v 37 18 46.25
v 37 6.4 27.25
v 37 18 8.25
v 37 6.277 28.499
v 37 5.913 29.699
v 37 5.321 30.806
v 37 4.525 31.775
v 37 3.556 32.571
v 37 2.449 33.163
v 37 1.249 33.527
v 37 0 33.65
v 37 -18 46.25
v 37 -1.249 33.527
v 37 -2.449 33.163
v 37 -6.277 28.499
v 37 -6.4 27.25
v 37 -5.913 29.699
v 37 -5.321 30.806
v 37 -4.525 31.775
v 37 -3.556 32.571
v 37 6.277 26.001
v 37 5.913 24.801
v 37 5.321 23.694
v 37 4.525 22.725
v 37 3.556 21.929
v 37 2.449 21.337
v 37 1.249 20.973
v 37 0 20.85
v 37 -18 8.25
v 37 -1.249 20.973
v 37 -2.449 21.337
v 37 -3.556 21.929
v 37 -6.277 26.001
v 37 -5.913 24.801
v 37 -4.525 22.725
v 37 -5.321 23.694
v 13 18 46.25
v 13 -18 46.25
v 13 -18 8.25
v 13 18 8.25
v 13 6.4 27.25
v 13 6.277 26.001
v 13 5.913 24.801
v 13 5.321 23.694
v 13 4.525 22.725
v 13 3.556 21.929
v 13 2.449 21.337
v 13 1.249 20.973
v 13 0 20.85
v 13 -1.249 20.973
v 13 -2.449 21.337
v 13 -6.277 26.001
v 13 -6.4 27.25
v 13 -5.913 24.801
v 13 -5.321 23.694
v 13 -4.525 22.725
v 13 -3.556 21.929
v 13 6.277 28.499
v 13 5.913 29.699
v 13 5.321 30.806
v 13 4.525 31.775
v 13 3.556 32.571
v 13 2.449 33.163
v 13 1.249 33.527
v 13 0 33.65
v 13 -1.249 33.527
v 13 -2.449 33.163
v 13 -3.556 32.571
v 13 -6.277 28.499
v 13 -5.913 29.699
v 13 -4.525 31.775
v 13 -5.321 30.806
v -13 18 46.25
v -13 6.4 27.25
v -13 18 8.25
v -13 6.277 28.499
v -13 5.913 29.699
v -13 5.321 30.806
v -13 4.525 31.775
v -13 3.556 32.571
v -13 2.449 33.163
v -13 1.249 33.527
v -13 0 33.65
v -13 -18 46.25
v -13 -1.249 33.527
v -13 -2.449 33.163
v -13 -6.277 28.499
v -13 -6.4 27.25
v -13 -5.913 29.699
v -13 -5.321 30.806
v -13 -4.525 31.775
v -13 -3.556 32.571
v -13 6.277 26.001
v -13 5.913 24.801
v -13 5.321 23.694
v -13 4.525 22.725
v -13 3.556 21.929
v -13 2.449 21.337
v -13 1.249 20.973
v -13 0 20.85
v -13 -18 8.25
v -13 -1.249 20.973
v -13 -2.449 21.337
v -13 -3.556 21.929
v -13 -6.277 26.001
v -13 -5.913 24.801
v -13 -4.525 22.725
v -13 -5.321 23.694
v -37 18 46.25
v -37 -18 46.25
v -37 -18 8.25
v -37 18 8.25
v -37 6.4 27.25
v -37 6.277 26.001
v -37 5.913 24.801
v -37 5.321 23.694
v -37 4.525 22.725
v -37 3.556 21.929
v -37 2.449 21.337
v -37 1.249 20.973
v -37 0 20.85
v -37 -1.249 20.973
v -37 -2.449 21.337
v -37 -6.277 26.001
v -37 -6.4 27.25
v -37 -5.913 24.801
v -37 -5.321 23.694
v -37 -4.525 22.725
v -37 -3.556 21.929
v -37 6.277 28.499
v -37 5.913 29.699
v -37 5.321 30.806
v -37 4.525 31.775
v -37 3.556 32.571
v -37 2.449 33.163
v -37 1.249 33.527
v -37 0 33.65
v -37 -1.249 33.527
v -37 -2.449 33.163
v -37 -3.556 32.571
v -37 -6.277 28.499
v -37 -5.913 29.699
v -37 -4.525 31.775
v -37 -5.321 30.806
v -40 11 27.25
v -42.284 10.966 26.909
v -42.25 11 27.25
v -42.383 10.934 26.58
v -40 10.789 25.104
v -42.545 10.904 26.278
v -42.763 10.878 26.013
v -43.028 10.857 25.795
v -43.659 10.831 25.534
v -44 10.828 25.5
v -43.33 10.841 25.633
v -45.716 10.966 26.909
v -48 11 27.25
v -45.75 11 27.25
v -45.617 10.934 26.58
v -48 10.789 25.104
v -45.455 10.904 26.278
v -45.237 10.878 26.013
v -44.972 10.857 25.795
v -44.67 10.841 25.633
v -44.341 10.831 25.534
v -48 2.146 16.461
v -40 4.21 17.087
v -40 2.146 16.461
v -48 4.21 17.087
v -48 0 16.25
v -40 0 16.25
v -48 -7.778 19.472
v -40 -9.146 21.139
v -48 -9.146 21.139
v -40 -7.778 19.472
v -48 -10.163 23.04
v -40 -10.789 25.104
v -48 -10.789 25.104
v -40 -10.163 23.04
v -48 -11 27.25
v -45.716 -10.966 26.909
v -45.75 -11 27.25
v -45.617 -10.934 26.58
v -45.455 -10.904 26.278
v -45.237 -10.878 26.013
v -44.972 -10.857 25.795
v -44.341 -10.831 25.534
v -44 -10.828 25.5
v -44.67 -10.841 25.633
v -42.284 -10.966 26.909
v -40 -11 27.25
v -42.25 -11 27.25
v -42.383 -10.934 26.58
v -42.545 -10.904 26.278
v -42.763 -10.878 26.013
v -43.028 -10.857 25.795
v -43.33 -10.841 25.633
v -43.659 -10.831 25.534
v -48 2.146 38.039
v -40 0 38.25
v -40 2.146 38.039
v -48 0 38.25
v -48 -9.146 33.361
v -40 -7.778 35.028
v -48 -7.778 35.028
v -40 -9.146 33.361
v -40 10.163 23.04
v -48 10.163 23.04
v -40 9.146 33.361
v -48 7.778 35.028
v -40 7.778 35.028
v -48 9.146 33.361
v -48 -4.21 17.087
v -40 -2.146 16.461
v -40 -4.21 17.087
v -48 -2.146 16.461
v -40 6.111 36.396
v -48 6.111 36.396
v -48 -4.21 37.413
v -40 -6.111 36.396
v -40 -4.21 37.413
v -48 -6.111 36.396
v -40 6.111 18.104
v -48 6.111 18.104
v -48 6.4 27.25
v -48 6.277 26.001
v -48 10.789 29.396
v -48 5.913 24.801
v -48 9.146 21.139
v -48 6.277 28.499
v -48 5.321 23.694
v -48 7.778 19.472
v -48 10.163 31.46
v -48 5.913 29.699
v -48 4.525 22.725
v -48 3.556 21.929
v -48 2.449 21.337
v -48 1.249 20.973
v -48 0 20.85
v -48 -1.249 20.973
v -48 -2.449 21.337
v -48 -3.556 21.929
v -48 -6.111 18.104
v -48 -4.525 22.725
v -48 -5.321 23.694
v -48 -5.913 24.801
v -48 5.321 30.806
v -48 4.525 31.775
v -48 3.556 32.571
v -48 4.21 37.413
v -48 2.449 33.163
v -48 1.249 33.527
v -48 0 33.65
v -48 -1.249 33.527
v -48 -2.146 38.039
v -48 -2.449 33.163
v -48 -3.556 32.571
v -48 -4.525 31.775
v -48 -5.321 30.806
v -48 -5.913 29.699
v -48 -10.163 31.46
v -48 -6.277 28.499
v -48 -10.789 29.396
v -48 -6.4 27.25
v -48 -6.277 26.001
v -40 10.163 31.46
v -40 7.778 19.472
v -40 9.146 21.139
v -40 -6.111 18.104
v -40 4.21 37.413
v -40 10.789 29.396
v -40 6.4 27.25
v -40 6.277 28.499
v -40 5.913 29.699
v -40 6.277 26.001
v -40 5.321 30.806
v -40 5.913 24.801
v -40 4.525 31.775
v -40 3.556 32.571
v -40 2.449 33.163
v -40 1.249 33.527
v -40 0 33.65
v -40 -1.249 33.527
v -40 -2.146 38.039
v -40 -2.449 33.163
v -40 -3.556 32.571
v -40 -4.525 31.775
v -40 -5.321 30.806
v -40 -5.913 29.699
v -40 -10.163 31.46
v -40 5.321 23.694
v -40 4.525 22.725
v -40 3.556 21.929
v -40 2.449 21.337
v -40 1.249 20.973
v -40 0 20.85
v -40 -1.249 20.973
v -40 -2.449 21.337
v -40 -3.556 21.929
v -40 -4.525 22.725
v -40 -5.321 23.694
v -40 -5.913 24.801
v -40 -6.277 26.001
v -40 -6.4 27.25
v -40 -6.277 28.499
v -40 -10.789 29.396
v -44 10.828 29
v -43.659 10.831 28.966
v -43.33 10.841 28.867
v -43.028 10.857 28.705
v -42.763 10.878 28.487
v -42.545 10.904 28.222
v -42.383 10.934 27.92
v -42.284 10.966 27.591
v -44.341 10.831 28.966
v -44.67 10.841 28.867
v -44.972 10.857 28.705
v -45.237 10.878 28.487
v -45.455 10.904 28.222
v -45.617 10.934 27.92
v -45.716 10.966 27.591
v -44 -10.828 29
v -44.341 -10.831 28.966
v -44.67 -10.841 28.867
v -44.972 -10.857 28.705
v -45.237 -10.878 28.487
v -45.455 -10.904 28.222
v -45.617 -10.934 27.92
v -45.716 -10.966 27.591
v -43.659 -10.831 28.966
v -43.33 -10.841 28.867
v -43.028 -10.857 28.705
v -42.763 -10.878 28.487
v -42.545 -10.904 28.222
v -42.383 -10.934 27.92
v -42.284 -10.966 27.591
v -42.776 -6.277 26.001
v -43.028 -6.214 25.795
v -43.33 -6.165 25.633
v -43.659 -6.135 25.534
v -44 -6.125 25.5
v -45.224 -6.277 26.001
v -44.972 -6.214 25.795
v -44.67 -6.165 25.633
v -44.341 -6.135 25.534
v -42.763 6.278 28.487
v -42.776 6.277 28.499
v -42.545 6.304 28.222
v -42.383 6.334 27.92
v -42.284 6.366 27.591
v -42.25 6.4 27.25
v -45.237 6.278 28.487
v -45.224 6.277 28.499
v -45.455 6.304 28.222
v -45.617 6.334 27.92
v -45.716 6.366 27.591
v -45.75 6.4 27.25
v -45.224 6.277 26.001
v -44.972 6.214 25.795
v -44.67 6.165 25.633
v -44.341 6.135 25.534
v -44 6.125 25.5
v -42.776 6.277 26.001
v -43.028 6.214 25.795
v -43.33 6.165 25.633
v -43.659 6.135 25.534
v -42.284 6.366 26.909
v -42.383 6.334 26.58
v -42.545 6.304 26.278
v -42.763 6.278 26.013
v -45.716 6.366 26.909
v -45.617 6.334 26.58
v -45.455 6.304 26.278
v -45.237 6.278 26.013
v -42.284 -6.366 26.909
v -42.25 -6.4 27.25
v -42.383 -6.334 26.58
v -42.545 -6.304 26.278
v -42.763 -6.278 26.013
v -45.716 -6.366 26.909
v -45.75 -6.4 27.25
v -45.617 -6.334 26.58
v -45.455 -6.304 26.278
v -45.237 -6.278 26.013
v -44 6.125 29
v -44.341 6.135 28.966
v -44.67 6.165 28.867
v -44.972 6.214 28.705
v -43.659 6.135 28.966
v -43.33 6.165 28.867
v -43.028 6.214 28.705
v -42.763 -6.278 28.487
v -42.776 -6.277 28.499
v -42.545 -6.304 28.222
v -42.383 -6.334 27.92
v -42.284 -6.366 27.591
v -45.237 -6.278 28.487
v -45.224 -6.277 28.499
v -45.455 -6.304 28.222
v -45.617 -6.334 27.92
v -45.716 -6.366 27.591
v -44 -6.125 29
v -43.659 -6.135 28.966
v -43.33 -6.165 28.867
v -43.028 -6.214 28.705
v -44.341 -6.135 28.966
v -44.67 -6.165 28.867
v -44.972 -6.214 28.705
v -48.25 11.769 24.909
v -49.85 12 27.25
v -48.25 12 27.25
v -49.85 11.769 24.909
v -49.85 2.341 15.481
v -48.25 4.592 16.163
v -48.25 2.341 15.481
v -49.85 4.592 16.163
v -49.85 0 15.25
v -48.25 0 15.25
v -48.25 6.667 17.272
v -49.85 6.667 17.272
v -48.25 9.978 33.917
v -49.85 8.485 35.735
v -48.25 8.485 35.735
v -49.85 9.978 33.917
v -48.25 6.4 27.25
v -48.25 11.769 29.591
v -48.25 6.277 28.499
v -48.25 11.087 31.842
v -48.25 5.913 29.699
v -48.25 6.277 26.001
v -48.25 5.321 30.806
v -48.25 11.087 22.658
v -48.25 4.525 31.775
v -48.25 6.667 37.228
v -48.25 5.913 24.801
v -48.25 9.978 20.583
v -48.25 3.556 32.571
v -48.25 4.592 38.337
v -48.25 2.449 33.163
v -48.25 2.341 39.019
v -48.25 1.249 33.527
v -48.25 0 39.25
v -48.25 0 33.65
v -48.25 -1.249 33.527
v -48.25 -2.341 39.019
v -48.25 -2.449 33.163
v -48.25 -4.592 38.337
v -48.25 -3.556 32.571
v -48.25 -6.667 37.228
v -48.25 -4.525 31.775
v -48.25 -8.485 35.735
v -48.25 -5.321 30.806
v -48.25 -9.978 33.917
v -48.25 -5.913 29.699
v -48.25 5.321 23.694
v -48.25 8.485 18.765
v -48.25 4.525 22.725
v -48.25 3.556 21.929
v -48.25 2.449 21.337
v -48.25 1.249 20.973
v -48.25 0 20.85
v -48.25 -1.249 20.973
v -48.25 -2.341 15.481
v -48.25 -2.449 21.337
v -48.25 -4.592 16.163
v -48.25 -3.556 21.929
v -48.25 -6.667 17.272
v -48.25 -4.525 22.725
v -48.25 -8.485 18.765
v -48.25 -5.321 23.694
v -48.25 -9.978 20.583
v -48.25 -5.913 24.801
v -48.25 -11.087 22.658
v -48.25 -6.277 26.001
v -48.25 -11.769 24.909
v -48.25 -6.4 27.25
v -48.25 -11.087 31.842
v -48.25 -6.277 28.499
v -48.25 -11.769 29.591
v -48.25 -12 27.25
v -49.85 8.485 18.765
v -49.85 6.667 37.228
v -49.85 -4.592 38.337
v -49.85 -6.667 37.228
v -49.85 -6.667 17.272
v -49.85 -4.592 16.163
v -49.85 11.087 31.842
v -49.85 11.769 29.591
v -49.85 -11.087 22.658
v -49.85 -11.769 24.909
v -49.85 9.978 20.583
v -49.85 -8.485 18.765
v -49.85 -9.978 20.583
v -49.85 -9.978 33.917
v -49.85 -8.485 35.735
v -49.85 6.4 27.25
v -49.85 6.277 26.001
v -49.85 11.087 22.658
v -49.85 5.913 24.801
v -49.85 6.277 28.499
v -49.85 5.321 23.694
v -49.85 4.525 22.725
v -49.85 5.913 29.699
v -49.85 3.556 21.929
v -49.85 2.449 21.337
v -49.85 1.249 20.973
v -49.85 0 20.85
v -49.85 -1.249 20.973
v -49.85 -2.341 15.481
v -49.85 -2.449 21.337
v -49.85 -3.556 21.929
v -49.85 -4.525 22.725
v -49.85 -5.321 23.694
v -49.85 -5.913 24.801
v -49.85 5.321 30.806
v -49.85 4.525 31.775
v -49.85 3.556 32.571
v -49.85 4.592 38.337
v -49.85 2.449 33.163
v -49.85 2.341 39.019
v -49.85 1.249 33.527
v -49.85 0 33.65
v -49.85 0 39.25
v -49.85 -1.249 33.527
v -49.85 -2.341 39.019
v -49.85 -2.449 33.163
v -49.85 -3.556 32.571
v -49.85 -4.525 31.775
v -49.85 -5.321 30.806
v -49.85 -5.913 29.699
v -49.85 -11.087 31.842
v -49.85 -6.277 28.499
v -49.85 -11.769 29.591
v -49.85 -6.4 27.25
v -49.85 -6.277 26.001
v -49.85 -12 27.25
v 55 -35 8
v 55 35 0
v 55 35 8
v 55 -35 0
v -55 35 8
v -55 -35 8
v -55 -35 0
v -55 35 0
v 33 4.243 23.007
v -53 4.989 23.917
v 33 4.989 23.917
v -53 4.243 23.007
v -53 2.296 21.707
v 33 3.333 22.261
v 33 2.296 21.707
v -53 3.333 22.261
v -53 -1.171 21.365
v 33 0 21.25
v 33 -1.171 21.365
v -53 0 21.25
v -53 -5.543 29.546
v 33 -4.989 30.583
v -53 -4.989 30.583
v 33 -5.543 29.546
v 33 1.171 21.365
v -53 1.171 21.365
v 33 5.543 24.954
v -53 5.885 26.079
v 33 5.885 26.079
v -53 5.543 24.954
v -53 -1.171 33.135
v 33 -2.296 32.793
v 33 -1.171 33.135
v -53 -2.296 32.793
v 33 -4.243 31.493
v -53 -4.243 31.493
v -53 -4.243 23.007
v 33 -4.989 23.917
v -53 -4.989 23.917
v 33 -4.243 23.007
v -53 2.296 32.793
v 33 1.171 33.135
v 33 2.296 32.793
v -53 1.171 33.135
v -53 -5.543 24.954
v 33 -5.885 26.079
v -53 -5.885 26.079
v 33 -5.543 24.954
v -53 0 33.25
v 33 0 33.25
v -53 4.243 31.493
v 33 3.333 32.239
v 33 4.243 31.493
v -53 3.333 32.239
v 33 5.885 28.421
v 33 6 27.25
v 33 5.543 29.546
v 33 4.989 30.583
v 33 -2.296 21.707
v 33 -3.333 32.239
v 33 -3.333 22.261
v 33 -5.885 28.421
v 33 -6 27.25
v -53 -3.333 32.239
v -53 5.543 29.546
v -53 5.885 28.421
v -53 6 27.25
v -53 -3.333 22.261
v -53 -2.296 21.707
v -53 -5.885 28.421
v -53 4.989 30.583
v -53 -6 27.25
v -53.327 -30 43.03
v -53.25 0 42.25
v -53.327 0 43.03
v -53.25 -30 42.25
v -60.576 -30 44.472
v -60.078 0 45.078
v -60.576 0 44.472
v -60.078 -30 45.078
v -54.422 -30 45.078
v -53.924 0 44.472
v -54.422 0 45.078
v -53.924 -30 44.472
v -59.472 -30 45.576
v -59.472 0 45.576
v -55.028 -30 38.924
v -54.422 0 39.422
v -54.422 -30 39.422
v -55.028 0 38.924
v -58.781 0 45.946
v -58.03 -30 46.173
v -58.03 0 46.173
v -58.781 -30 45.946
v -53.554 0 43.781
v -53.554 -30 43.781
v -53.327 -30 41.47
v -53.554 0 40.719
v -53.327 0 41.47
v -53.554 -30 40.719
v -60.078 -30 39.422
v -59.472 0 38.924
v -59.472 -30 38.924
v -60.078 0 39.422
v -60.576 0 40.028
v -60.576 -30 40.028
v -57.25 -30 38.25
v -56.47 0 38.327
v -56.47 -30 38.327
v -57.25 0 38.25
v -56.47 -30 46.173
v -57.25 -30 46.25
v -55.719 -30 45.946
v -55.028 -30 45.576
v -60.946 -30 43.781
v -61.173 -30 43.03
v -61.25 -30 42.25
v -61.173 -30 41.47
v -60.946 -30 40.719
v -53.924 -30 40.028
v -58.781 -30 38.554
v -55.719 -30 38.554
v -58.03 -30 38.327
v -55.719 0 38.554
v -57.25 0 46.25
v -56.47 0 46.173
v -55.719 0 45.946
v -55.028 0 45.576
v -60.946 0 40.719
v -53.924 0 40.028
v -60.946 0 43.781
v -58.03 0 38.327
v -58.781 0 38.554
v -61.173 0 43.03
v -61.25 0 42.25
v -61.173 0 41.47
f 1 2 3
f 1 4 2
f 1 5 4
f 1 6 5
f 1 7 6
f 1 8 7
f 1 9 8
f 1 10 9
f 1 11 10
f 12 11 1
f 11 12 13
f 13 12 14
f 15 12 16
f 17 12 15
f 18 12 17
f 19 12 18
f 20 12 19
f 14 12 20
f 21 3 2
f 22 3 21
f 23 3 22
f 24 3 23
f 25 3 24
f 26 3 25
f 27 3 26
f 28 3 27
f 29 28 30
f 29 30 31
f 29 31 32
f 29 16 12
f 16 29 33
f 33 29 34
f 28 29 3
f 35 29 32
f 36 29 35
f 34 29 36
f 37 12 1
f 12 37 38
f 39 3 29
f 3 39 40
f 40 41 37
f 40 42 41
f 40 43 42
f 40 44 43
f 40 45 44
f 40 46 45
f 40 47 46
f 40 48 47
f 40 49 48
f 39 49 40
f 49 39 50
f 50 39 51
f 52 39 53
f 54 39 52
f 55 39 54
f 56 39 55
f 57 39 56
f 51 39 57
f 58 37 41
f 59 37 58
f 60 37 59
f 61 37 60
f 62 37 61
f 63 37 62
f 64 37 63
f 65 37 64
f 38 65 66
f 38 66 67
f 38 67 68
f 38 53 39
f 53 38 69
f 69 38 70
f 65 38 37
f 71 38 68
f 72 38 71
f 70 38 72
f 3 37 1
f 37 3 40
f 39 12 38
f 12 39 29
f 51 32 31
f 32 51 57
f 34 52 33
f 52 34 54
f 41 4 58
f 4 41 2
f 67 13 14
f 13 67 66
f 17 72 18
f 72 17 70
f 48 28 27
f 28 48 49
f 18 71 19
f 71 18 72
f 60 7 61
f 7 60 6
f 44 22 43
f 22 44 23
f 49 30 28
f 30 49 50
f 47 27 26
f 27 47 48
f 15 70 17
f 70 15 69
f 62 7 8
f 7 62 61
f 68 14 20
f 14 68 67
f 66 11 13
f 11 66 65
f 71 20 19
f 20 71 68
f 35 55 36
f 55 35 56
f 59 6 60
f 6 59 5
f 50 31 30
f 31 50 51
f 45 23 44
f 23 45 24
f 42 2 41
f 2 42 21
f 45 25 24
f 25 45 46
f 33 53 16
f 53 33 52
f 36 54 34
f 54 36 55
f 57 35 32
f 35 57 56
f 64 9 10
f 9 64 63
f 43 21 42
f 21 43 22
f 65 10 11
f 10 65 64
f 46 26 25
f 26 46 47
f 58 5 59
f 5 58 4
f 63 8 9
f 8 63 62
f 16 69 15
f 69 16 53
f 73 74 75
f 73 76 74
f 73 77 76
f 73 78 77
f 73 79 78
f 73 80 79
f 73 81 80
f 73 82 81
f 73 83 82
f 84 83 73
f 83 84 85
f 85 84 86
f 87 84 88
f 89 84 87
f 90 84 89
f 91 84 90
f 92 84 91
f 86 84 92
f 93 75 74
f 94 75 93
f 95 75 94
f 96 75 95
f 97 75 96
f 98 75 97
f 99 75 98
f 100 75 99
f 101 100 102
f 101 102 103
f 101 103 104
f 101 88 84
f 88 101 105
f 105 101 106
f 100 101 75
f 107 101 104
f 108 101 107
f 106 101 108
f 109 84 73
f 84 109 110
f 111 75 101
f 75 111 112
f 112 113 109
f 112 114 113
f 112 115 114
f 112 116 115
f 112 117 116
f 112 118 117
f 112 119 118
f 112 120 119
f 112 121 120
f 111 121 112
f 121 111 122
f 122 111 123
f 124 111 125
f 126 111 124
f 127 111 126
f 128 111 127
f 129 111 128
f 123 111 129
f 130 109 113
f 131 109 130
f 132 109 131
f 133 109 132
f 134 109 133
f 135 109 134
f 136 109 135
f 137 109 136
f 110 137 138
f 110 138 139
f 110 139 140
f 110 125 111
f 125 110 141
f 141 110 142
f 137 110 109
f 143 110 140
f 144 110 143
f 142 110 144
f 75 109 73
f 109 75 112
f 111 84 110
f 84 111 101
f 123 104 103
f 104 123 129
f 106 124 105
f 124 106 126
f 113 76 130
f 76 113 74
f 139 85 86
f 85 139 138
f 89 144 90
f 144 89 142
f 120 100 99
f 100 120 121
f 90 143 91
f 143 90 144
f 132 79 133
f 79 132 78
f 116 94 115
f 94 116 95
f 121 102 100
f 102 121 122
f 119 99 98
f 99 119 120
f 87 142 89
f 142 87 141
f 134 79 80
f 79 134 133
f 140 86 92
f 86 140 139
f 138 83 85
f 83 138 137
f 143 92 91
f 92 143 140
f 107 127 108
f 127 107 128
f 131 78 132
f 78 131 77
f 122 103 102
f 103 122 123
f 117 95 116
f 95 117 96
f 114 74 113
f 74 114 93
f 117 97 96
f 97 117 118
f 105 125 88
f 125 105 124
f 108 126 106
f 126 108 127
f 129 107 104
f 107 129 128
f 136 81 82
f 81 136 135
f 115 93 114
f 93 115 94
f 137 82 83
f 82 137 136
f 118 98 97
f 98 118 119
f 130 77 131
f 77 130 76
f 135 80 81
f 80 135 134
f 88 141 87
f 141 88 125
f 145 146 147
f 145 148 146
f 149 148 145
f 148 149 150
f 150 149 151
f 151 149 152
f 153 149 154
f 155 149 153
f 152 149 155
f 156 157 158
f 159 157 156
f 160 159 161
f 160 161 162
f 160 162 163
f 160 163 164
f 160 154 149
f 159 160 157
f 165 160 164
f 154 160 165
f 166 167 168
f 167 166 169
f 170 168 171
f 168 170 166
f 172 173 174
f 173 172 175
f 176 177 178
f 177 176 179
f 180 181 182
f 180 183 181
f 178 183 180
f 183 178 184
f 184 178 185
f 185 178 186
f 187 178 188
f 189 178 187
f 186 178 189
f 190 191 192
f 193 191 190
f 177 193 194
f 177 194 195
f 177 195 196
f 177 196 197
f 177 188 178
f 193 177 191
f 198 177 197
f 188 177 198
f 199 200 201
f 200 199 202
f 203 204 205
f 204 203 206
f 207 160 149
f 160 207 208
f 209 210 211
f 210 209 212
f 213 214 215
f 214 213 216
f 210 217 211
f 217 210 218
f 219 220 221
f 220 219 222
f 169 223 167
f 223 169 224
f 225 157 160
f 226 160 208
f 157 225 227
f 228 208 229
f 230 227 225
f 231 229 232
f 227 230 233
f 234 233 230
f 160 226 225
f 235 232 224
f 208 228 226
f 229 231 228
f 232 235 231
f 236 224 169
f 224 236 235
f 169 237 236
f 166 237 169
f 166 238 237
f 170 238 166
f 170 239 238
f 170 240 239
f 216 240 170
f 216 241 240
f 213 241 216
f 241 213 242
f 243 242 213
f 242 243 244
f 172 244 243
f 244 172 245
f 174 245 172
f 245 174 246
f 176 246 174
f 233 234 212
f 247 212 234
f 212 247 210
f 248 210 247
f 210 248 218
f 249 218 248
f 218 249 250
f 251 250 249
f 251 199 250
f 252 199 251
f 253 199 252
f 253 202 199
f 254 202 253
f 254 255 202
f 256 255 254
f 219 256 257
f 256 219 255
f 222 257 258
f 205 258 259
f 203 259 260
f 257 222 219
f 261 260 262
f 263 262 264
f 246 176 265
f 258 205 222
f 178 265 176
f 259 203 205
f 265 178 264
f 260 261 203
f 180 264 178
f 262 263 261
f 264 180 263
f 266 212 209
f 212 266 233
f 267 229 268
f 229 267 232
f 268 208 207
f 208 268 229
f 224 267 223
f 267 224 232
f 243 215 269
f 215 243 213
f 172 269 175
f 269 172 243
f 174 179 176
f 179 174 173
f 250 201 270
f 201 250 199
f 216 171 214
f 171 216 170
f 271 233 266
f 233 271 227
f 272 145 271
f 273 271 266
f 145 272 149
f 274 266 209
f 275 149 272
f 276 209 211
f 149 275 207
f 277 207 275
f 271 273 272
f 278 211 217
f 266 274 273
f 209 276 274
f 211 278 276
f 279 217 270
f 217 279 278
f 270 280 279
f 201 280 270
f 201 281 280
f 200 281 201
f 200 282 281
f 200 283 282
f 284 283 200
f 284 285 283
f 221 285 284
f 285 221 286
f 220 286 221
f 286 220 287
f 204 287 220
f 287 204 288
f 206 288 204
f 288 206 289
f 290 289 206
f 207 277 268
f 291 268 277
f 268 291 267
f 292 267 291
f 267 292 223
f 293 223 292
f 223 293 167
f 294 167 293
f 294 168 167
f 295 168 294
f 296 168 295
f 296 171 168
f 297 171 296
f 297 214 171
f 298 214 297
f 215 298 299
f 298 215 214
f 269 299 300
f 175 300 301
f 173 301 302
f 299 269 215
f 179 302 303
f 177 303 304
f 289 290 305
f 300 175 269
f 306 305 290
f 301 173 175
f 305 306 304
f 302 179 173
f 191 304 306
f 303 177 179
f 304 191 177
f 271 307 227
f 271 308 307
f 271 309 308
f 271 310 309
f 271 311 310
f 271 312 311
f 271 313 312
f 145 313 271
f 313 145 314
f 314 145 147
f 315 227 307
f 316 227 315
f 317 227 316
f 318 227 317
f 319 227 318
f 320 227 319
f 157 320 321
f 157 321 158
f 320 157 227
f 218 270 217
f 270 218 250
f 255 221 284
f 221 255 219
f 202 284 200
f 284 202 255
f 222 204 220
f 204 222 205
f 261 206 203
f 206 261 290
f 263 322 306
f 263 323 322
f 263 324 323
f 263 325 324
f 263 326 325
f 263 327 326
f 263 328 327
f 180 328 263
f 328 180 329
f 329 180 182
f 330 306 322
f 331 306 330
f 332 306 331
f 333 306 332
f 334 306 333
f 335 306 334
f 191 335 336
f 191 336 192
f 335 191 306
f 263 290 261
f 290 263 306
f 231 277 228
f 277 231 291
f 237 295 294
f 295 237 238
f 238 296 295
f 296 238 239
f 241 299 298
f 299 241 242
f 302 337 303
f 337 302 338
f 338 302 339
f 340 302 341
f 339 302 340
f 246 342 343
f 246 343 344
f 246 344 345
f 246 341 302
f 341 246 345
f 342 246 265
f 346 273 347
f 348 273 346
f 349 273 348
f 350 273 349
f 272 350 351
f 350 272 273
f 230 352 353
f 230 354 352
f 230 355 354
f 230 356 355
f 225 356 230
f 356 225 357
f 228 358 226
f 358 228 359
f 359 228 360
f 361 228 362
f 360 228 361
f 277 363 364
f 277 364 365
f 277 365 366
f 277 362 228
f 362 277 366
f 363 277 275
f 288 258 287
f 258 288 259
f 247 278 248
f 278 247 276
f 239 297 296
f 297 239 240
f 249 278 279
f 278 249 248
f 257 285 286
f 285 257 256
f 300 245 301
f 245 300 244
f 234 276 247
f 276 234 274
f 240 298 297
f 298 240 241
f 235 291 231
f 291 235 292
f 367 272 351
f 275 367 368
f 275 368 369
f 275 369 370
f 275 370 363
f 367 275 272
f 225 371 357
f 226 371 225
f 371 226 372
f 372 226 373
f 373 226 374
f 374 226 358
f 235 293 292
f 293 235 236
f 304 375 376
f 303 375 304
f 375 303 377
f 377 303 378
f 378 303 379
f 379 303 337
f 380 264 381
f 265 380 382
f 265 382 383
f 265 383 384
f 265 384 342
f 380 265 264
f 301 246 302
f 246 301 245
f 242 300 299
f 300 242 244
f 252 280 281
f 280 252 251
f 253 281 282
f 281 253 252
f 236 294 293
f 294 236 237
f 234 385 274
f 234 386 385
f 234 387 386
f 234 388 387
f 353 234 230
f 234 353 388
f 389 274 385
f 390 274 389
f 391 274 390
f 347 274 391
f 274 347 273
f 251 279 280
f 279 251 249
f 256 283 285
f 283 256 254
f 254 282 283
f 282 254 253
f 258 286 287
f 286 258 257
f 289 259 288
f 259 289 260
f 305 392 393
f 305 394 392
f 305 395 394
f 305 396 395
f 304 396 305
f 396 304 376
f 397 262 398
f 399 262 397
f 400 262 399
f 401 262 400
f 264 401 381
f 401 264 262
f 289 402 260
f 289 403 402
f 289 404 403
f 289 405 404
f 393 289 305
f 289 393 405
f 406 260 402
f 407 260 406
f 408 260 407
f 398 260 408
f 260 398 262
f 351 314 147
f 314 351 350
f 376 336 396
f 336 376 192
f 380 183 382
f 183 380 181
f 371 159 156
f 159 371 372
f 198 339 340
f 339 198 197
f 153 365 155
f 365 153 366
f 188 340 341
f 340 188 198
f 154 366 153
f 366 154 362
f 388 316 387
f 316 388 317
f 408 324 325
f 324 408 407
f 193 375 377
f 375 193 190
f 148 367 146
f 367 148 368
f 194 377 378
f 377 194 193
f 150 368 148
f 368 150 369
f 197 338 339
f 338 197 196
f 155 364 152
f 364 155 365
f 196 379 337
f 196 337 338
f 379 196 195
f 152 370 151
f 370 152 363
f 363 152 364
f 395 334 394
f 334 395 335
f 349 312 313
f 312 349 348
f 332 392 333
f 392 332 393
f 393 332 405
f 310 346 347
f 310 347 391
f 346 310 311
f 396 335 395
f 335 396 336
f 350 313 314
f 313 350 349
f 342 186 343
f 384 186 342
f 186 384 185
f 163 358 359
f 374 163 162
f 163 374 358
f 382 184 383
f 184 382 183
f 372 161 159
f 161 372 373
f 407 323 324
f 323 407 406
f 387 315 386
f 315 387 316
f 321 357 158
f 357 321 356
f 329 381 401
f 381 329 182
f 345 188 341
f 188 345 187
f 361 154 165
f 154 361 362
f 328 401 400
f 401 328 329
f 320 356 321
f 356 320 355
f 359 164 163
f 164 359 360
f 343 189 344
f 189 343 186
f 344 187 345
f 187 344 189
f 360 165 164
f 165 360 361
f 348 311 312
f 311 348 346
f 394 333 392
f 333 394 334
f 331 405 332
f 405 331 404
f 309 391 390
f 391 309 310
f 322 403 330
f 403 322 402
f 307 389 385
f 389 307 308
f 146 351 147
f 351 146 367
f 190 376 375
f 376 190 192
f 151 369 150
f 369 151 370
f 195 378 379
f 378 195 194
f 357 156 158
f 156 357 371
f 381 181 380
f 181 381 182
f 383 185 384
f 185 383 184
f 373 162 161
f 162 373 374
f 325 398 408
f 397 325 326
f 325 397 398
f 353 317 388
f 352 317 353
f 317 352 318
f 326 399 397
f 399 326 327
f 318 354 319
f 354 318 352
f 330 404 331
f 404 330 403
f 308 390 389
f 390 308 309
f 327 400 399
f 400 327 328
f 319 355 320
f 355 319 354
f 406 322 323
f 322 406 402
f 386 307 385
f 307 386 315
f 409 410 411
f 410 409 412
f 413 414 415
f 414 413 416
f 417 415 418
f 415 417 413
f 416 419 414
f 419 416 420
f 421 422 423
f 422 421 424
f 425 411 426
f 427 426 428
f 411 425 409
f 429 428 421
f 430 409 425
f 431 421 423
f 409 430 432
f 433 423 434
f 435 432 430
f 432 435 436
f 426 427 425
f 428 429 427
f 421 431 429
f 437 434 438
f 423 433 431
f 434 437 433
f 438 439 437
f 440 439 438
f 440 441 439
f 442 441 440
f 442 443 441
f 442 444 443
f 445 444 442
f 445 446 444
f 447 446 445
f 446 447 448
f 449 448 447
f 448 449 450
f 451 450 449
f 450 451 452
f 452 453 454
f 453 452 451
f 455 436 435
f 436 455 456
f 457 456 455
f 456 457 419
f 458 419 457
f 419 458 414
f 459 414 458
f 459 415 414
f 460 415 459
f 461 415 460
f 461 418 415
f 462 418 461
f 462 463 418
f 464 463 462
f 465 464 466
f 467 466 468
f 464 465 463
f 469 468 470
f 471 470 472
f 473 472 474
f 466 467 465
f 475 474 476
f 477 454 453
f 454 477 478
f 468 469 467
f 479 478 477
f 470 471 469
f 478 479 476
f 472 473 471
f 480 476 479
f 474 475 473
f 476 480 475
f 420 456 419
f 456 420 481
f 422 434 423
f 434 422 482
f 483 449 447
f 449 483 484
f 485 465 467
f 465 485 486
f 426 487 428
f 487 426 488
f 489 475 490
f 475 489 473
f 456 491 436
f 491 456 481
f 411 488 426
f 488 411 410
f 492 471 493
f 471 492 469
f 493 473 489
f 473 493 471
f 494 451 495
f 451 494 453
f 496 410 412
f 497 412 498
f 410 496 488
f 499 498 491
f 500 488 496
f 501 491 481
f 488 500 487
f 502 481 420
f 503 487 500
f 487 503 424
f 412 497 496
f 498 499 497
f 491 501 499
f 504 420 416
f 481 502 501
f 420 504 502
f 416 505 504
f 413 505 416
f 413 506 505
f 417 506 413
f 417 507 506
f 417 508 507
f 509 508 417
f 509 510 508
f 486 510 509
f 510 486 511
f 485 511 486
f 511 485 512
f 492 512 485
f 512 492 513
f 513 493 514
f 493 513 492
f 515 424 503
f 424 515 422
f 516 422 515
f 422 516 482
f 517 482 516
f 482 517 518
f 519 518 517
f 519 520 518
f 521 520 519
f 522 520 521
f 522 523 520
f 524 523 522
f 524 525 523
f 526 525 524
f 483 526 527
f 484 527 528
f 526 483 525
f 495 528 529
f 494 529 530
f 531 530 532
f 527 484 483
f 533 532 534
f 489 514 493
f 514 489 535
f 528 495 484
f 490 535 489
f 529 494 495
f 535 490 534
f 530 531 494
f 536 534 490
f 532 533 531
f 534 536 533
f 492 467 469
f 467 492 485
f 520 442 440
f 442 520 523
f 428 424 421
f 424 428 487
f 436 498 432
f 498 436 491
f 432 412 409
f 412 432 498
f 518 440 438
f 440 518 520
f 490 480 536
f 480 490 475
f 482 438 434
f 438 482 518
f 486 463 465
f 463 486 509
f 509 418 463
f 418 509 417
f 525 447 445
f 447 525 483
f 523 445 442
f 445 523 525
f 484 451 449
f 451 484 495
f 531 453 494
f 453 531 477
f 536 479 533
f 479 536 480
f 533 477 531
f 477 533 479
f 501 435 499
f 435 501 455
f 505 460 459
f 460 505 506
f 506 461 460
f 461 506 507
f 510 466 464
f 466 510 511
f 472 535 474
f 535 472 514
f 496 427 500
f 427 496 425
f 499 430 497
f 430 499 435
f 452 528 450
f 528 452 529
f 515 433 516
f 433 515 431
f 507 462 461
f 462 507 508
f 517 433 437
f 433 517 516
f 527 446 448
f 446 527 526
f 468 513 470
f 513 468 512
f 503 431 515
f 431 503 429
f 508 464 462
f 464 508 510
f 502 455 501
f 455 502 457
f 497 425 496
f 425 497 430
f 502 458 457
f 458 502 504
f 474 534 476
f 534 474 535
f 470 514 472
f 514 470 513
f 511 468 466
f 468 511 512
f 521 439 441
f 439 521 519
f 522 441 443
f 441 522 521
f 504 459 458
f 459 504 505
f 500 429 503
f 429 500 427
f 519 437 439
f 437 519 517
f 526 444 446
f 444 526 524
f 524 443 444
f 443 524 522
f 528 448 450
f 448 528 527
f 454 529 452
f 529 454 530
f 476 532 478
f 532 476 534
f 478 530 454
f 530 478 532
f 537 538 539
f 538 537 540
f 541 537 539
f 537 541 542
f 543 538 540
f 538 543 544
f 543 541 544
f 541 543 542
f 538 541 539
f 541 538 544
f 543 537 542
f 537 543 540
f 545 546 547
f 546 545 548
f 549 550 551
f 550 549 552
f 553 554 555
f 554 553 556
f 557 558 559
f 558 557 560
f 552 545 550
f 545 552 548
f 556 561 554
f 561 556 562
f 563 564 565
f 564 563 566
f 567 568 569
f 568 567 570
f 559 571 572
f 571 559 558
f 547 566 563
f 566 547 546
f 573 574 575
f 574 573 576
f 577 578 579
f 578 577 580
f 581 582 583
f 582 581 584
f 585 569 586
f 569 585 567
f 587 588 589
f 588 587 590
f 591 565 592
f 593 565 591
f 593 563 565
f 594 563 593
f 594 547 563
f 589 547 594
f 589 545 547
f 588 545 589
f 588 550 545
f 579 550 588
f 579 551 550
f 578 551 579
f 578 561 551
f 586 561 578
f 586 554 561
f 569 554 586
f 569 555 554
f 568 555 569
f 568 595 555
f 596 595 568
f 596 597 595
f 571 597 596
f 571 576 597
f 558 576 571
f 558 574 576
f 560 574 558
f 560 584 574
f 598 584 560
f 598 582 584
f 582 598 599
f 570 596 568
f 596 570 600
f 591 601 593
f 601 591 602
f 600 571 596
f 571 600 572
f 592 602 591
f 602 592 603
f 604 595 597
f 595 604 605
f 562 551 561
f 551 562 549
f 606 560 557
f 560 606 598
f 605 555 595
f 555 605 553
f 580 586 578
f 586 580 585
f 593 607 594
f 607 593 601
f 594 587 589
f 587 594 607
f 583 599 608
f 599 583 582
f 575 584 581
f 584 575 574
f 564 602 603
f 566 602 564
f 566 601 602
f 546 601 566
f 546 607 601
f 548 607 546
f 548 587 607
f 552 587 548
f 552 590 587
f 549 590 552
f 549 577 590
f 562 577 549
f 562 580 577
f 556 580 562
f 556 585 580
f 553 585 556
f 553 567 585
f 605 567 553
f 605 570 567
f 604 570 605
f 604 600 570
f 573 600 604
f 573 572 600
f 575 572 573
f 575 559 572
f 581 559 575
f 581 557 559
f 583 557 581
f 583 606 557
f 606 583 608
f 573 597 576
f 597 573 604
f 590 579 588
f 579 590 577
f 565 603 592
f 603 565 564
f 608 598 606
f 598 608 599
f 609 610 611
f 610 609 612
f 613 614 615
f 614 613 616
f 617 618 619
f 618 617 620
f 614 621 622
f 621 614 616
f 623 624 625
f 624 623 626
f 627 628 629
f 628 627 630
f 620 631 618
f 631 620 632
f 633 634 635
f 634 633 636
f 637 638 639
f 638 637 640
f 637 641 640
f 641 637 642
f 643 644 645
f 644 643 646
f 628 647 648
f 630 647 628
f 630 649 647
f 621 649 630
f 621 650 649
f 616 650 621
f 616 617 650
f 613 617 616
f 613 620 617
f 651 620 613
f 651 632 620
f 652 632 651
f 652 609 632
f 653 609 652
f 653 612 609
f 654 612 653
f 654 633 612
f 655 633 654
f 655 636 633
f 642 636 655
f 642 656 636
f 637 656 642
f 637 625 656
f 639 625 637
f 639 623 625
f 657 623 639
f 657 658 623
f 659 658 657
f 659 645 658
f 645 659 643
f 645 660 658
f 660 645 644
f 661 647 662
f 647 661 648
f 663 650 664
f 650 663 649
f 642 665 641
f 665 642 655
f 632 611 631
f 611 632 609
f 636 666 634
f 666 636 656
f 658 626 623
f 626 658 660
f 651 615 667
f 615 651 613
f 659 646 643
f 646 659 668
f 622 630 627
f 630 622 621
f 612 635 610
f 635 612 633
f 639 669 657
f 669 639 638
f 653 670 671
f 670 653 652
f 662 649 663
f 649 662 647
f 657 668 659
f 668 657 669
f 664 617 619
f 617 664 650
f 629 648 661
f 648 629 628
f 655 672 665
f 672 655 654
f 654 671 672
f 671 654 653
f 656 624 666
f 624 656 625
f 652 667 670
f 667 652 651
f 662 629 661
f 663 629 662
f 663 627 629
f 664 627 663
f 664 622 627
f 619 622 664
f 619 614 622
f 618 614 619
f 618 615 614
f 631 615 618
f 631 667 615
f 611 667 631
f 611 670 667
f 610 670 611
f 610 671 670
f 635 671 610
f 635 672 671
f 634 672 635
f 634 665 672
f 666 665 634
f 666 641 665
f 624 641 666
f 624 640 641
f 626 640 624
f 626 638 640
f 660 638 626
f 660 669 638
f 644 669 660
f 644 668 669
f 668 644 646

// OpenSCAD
$fn = 32;

// ------------------------------------------------------------------------
// Machine vise: screw d12, jaws 24 x 38 mm
// Every part is its own module, assembly() places every instance.
// ------------------------------------------------------------------------

// --- part 1 ---
module vise_bed() {
  difference() {
    translate([-55, -35, 0]) cube([110, 70, 8]);
  }
}

// --- part 2 ---
module vise_jaw() {
  difference() {
    translate([-12, -18, 0]) cube([24, 36, 38]);
    translate([0, 0, 19]) rotate([0, 90, 0]) cylinder(h = 26, d = 12.8, center = true);
  }
}

// --- part 3 ---
module vise_screw() {
  translate([0, 0, -43]) cylinder(h = 86, d = 12);
}

// --- part 4 ---
module screw_collar() {
  difference() {
    cylinder(h = 8, d = 22);
    translate([0, 0, -1]) cylinder(h = 10, d = 12.8);
    translate([0, 0, 4]) rotate([90, 0, 0]) cylinder(h = 24, d = 3.5, center = true);
  }
}

// --- part 5 ---
module screw_washer() {
  difference() {
      translate([0, 0, 0]) cylinder(h = 1.6, d = 24);
      translate([0, 0, -1]) cylinder(h = 3.6, d = 12.8);
    }
}

// --- part 6 ---
module vise_handle() {
  cylinder(h = 30, d = 8);
}

// --- assembly ---
module assembly() {
  color([0.80, 0.24, 0.20]) translate([0, 0, 0]) rotate([0, 0, 0]) vise_bed();
  color([0.20, 0.45, 0.75]) translate([25, 0, 8.25]) rotate([0, 0, 0]) vise_jaw();
  color([0.25, 0.62, 0.32]) translate([-25, 0, 8.25]) rotate([0, 0, 0]) vise_jaw();
  color([0.92, 0.70, 0.18]) translate([-10, 0, 27.25]) rotate([0, 90, 0]) vise_screw();
  color([0.58, 0.35, 0.70]) translate([-48, 0, 27.25]) rotate([0, 90, 0]) screw_collar();
  color([0.16, 0.66, 0.66]) translate([-49.85, 0, 27.25]) rotate([0, 90, 0]) screw_washer();
  color([0.85, 0.48, 0.18]) translate([-57.25, 0, 42.25]) rotate([90, 0, 0]) vise_handle();
}

assembly();
